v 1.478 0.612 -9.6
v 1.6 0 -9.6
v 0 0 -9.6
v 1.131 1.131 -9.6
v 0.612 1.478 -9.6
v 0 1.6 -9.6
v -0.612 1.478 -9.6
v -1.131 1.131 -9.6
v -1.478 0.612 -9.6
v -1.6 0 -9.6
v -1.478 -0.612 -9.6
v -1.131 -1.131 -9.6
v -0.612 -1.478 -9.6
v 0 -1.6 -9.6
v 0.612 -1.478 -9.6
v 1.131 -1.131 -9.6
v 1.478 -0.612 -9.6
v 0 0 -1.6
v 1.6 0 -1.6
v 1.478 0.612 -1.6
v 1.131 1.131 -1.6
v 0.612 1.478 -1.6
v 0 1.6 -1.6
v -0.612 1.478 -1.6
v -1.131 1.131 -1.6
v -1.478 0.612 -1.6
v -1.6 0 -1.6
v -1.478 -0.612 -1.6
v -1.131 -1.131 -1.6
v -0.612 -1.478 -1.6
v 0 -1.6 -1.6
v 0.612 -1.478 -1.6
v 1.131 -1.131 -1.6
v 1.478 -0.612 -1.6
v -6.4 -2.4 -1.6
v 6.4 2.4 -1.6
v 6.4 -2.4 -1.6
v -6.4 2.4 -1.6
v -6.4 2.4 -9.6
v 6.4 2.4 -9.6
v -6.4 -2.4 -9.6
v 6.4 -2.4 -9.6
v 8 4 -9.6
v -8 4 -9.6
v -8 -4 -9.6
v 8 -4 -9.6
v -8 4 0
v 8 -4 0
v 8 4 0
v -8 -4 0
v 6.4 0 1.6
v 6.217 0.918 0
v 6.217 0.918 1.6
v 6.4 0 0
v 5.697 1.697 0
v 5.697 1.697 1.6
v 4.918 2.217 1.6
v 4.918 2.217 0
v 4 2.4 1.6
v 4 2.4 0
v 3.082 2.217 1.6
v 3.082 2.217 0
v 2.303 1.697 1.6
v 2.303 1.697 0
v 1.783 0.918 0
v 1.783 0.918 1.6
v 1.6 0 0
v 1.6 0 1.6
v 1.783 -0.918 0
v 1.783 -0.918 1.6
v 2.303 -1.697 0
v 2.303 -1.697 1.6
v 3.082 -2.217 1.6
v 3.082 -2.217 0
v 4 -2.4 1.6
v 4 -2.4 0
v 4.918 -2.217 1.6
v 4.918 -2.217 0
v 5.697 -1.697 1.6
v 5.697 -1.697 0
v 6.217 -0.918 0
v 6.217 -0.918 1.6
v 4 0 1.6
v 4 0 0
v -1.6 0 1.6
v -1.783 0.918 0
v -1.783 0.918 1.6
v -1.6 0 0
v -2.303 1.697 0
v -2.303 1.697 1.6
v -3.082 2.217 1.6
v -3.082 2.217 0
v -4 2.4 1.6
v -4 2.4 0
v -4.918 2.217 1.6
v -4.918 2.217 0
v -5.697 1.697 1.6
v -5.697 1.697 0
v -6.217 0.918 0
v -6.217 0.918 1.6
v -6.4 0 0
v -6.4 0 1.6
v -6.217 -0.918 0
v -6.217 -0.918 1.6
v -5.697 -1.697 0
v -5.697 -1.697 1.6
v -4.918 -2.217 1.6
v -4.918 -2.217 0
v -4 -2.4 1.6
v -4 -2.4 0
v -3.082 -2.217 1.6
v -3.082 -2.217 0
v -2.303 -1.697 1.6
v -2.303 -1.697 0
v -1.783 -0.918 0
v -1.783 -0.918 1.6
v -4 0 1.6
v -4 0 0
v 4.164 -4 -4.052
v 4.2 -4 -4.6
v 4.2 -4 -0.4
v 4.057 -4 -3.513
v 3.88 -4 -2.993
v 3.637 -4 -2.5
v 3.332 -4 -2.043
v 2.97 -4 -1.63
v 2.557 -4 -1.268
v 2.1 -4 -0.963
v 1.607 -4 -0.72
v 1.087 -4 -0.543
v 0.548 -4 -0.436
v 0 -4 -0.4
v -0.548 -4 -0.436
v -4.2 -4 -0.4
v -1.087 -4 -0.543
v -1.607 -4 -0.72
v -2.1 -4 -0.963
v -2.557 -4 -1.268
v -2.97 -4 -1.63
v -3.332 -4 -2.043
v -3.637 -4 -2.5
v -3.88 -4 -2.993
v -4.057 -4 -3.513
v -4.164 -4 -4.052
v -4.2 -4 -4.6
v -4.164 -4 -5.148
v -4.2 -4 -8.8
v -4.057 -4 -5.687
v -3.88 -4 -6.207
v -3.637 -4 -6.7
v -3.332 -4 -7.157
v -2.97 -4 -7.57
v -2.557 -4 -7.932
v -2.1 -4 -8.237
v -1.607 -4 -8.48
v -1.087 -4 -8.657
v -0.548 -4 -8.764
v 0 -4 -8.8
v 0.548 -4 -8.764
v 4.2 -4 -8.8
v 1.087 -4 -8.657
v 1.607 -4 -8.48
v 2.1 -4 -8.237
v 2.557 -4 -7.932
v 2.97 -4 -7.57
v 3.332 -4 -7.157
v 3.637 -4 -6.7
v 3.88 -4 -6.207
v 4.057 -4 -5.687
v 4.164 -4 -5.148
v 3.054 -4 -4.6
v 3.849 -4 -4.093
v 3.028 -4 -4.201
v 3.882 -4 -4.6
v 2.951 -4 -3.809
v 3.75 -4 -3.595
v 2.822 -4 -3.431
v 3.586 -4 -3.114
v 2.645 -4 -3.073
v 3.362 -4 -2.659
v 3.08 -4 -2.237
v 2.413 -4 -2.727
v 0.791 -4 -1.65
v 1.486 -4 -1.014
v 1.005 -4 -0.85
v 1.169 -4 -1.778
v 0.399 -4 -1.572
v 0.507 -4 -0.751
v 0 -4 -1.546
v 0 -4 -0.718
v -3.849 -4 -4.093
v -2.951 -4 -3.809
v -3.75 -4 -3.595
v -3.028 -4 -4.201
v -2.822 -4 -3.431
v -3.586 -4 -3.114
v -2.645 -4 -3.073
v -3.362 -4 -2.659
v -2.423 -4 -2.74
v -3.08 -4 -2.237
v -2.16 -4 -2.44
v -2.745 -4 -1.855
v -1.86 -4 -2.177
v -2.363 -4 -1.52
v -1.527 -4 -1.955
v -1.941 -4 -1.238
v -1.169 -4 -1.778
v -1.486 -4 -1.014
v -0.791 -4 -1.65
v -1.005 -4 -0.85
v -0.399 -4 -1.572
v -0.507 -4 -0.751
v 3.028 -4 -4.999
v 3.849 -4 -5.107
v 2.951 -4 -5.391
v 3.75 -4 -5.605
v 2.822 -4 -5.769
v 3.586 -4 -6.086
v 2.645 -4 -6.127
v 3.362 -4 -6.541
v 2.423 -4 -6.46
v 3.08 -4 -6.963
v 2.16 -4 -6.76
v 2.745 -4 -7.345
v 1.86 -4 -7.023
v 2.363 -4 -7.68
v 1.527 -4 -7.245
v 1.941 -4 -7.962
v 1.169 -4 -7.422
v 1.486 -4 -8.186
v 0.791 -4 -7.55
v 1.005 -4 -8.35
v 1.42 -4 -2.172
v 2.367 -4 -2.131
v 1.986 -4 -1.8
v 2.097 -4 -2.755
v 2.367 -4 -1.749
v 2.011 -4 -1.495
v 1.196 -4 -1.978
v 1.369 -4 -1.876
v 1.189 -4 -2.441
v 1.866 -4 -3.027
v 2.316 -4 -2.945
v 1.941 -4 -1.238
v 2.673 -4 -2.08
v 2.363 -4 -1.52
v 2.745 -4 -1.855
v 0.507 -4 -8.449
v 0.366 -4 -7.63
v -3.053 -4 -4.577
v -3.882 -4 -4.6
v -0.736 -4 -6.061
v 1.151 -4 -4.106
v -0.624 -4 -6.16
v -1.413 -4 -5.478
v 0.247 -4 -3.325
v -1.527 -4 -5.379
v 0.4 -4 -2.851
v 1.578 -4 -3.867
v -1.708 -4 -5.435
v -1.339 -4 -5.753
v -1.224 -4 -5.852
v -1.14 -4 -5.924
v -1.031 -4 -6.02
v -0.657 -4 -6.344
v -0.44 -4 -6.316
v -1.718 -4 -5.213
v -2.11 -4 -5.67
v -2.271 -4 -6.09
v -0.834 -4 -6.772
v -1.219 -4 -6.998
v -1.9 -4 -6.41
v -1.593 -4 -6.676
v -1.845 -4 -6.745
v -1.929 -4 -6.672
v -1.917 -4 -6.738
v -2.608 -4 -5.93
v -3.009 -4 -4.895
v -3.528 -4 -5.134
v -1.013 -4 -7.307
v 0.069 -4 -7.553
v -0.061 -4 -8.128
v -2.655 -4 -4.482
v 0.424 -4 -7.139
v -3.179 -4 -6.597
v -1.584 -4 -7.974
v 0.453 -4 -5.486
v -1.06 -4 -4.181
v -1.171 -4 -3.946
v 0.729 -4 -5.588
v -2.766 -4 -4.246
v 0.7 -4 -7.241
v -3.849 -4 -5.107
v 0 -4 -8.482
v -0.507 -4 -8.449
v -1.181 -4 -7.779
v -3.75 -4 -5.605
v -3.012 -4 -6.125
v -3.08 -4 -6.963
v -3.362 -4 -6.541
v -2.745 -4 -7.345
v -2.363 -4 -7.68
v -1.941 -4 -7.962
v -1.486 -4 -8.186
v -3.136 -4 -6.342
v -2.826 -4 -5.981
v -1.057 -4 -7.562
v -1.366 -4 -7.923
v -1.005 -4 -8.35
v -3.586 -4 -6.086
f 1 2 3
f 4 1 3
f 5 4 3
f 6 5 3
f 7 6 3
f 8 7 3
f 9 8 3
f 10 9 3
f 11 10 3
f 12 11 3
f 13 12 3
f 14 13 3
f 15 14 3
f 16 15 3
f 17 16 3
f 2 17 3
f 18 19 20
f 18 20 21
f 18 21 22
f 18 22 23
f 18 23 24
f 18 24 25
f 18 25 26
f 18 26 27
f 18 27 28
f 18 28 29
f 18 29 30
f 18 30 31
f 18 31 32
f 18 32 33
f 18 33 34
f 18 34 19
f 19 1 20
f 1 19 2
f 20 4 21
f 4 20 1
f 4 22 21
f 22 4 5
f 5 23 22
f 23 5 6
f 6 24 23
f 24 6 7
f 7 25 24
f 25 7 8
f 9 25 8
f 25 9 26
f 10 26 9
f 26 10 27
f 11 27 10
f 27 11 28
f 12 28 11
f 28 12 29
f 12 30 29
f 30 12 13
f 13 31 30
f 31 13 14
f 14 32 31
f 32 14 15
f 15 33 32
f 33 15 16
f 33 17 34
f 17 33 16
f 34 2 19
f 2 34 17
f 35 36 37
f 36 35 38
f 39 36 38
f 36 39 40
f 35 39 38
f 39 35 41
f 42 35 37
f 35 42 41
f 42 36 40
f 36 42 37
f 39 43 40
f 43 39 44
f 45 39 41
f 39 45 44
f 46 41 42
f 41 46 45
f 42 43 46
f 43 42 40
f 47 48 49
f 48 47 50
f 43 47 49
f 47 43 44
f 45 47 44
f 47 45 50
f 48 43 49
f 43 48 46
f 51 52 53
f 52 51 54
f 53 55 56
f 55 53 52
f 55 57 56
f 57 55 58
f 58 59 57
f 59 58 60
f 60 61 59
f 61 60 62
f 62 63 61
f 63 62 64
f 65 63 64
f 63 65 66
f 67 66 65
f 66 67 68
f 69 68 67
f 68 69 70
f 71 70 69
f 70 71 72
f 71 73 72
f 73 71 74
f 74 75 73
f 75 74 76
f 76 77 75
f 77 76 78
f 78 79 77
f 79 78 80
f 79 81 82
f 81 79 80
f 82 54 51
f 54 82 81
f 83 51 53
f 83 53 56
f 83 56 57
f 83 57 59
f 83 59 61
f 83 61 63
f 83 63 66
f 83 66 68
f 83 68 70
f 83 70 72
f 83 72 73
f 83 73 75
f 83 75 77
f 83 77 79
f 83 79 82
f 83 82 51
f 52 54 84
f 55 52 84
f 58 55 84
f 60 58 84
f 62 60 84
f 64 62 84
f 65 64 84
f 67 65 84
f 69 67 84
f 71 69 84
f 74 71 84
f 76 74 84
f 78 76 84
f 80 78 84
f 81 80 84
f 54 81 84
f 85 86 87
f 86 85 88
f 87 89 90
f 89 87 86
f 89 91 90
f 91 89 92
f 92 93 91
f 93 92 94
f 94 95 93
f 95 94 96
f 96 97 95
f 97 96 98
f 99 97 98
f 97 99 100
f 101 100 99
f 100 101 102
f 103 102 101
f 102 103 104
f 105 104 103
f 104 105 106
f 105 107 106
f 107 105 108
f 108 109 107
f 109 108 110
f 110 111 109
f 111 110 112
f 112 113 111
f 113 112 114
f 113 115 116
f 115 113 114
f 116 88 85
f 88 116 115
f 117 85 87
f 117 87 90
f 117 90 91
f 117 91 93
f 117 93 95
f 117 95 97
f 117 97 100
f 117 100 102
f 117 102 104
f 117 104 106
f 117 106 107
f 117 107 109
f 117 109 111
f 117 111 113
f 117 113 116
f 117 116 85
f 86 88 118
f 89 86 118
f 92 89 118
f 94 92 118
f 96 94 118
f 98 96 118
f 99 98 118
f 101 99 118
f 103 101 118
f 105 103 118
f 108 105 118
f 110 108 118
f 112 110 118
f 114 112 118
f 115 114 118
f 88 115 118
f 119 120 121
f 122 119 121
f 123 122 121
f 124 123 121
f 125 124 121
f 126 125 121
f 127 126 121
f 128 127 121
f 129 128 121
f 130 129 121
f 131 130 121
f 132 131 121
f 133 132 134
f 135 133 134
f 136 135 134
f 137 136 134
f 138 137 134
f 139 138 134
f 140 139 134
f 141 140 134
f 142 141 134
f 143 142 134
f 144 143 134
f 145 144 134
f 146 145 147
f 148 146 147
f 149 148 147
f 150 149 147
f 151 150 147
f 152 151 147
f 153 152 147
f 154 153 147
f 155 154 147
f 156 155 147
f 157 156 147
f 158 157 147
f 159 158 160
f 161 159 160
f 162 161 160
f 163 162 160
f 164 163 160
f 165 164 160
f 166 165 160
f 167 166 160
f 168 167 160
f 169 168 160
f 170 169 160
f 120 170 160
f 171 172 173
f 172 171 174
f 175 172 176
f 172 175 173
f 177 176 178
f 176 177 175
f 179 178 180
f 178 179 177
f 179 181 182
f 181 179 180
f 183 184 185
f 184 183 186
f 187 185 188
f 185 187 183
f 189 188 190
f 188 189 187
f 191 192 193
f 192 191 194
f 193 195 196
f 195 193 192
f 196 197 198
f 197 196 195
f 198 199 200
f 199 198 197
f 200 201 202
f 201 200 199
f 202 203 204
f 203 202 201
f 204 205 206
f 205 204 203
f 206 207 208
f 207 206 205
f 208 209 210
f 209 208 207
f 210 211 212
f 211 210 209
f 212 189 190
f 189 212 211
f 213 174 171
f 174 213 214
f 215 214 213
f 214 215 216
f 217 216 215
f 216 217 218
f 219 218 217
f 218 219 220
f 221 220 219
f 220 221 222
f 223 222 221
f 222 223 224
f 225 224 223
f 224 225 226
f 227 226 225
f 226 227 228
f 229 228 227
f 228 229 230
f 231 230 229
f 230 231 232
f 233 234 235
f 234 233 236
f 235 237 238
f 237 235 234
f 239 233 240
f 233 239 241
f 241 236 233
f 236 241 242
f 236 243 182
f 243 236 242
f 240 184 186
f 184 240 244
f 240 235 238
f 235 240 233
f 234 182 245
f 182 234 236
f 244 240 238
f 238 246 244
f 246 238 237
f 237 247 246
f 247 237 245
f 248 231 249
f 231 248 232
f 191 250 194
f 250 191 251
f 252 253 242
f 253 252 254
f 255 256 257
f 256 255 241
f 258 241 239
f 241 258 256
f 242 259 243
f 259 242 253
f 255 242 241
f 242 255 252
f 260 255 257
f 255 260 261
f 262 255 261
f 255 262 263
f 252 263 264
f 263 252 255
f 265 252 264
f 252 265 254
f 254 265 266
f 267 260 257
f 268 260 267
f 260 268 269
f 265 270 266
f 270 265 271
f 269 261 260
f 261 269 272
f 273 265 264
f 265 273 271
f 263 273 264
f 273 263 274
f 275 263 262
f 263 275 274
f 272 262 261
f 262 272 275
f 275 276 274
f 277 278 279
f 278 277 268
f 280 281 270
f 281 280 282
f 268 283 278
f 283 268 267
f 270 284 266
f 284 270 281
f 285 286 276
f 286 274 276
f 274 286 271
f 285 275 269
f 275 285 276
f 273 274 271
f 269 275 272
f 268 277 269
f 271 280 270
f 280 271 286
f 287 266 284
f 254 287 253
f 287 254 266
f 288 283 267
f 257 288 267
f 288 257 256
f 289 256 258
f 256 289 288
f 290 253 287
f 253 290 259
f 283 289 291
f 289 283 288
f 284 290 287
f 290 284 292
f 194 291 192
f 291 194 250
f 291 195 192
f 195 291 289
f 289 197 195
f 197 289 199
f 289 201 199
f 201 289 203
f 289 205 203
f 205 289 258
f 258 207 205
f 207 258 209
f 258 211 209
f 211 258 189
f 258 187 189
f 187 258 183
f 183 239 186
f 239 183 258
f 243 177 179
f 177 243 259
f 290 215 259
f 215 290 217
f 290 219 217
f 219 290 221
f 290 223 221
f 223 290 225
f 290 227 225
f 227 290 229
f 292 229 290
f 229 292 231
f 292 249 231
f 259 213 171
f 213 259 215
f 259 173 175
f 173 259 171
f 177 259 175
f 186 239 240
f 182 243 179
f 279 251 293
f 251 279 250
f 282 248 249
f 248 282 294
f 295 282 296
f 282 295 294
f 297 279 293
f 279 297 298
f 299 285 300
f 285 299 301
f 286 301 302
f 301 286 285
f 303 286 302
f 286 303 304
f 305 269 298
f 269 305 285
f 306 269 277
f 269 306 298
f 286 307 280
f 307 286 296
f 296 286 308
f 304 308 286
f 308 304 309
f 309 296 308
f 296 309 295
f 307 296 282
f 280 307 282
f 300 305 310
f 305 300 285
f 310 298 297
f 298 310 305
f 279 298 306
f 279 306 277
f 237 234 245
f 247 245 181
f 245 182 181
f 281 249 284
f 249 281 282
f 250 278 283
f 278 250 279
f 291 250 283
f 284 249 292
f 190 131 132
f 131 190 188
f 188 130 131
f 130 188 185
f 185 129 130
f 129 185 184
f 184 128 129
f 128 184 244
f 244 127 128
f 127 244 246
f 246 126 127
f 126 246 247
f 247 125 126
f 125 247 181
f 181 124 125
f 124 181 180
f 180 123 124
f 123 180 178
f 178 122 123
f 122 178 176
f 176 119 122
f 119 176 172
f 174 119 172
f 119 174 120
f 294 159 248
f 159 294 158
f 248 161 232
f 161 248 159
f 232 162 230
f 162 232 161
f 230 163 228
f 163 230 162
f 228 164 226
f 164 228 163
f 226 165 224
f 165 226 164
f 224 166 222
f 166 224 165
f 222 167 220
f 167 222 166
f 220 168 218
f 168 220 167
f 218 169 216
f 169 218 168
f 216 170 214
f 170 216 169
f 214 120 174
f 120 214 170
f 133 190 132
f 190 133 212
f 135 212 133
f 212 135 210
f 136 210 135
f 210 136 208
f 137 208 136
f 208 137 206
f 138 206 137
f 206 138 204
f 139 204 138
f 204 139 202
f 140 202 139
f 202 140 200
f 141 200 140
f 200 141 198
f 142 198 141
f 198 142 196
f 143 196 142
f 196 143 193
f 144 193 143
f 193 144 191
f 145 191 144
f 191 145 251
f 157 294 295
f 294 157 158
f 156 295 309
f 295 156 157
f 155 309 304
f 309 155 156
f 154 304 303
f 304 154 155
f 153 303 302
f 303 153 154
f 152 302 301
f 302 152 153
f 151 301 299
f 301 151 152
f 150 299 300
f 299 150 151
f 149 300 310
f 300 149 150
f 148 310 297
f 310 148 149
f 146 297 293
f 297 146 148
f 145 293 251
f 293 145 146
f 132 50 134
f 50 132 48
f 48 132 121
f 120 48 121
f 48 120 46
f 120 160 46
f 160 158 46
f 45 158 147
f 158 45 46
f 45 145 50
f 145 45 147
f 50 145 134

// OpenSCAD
// file: ../p/4-4edge.scad
use <../lib.scad>
function ldraw_lib__4_4edge() = [
// 0 Circle 1.0
// 0 Name: 4-4edge.dat
// 0 Author: James Jessiman
// 0 !LDRAW_ORG Primitive UPDATE 2017-01
// 0 !LICENSE Licensed under CC BY 2.0 and CC BY 4.0 : see CAreadme.txt
// 
// 0 BFC CERTIFY CCW
  [0,"BFC","CERTIFY"],
  [0,"BFC","CCW"],
// 
// 0 !HISTORY 1998-12-15 [PTadmin] Official Update 1998-10
// 0 !HISTORY 2005-12-28 [PTadmin] Official Update 2005-01
// 0 !HISTORY 2007-06-24 [PTadmin] Header formatted for Contributor Agreement
// 0 !HISTORY 2008-07-01 [PTadmin] Official Update 2008-01
// 0 !HISTORY 2017-01-15 [Steffen] BFCed
// 0 !HISTORY 2017-12-30 [PTadmin] Official Update 2017-01
// 
// 
// 2 24 1 0 0 0.9239 0 0.3827
  [2,24,1,0,0,0.9239,0,0.3827],
// 2 24 0.9239 0 0.3827 0.7071 0 0.7071
  [2,24,0.9239,0,0.3827,0.7071,0,0.7071],
// 2 24 0.7071 0 0.7071 0.3827 0 0.9239
  [2,24,0.7071,0,0.7071,0.3827,0,0.9239],
// 2 24 0.3827 0 0.9239 0 0 1
  [2,24,0.3827,0,0.9239,0,0,1],
// 2 24 0 0 1 -0.3827 0 0.9239
  [2,24,0,0,1,-0.3827,0,0.9239],
// 2 24 -0.3827 0 0.9239 -0.7071 0 0.7071
  [2,24,-0.3827,0,0.9239,-0.7071,0,0.7071],
// 2 24 -0.7071 0 0.7071 -0.9239 0 0.3827
  [2,24,-0.7071,0,0.7071,-0.9239,0,0.3827],
// 2 24 -0.9239 0 0.3827 -1 0 -0
  [2,24,-0.9239,0,0.3827,-1,0,-0],
// 2 24 -1 0 -0 -0.9239 0 -0.3827
  [2,24,-1,0,-0,-0.9239,0,-0.3827],
// 2 24 -0.9239 0 -0.3827 -0.7071 0 -0.7071
  [2,24,-0.9239,0,-0.3827,-0.7071,0,-0.7071],
// 2 24 -0.7071 0 -0.7071 -0.3827 0 -0.9239
  [2,24,-0.7071,0,-0.7071,-0.3827,0,-0.9239],
// 2 24 -0.3827 0 -0.9239 0 0 -1
  [2,24,-0.3827,0,-0.9239,0,0,-1],
// 2 24 0 0 -1 0.3827 0 -0.9239
  [2,24,0,0,-1,0.3827,0,-0.9239],
// 2 24 0.3827 0 -0.9239 0.7071 0 -0.7071
  [2,24,0.3827,0,-0.9239,0.7071,0,-0.7071],
// 2 24 0.7071 0 -0.7071 0.9239 0 -0.3827
  [2,24,0.7071,0,-0.7071,0.9239,0,-0.3827],
// 2 24 0.9239 0 -0.3827 1 0 0
  [2,24,0.9239,0,-0.3827,1,0,0],
];
module ldraw_lib__4_4edge(step=0, col=false, unit=2/5, alt=false, line=0.2, solid=!$preview)
    makepoly(ldraw_lib__4_4edge(), step=step, col=col, unit=unit, alt=alt, line=line, solid=solid);
ldraw_lib__4_4edge(line=0.2);
// file: ../p/4-4disc.scad
use <../lib.scad>
function ldraw_lib__4_4disc() = [
// 0 Disc 1.0
// 0 Name: 4-4disc.dat
// 0 Author: James Jessiman
// 0 !LDRAW_ORG Primitive UPDATE 2002-02
// 0 !LICENSE Licensed under CC BY 2.0 and CC BY 4.0 : see CAreadme.txt
// 
// 0 BFC CERTIFY CCW
  [0,"BFC","CERTIFY"],
  [0,"BFC","CCW"],
// 
// 0 !HISTORY 1998-12-15 [PTadmin] Official Update 1998-10
// 0 !HISTORY 2002-03-23 [sbliss] Added BFC statement
// 0 !HISTORY 2002-04-25 [PTadmin] Official Update 2002-02
// 0 !HISTORY 2007-06-24 [PTadmin] Header formatted for Contributor Agreement
// 0 !HISTORY 2008-07-01 [PTadmin] Official Update 2008-01
// 
// 
// 3 16 0 0 0 1 0 0 0.9239 0 0.3827
  [3,16,0,0,0,1,0,0,0.9239,0,0.3827],
// 3 16 0 0 0 0.9239 0 0.3827 0.7071 0 0.7071
  [3,16,0,0,0,0.9239,0,0.3827,0.7071,0,0.7071],
// 3 16 0 0 0 0.7071 0 0.7071 0.3827 0 0.9239
  [3,16,0,0,0,0.7071,0,0.7071,0.3827,0,0.9239],
// 3 16 0 0 0 0.3827 0 0.9239 0 0 1
  [3,16,0,0,0,0.3827,0,0.9239,0,0,1],
// 3 16 0 0 0 0 0 1 -0.3827 0 0.9239
  [3,16,0,0,0,0,0,1,-0.3827,0,0.9239],
// 3 16 0 0 0 -0.3827 0 0.9239 -0.7071 0 0.7071
  [3,16,0,0,0,-0.3827,0,0.9239,-0.7071,0,0.7071],
// 3 16 0 0 0 -0.7071 0 0.7071 -0.9239 0 0.3827
  [3,16,0,0,0,-0.7071,0,0.7071,-0.9239,0,0.3827],
// 3 16 0 0 0 -0.9239 0 0.3827 -1 0 -0
  [3,16,0,0,0,-0.9239,0,0.3827,-1,0,-0],
// 3 16 0 0 0 -1 0 -0 -0.9239 0 -0.3827
  [3,16,0,0,0,-1,0,-0,-0.9239,0,-0.3827],
// 3 16 0 0 0 -0.9239 0 -0.3827 -0.7071 0 -0.7071
  [3,16,0,0,0,-0.9239,0,-0.3827,-0.7071,0,-0.7071],
// 3 16 0 0 0 -0.7071 0 -0.7071 -0.3827 0 -0.9239
  [3,16,0,0,0,-0.7071,0,-0.7071,-0.3827,0,-0.9239],
// 3 16 0 0 0 -0.3827 0 -0.9239 0 0 -1
  [3,16,0,0,0,-0.3827,0,-0.9239,0,0,-1],
// 3 16 0 0 0 0 0 -1 0.3827 0 -0.9239
  [3,16,0,0,0,0,0,-1,0.3827,0,-0.9239],
// 3 16 0 0 0 0.3827 0 -0.9239 0.7071 0 -0.7071
  [3,16,0,0,0,0.3827,0,-0.9239,0.7071,0,-0.7071],
// 3 16 0 0 0 0.7071 0 -0.7071 0.9239 0 -0.3827
  [3,16,0,0,0,0.7071,0,-0.7071,0.9239,0,-0.3827],
// 3 16 0 0 0 0.9239 0 -0.3827 1 0 0
  [3,16,0,0,0,0.9239,0,-0.3827,1,0,0],
// 0
];
module ldraw_lib__4_4disc(step=0, col=false, unit=2/5, alt=false, line=0.2, solid=!$preview)
    makepoly(ldraw_lib__4_4disc(), step=step, col=col, unit=unit, alt=alt, line=line, solid=solid);
ldraw_lib__4_4disc(line=0.2);
// file: ../p/4-4cyli.scad
use <../lib.scad>
$fa=1; $fs=0.2;
function ldraw_lib__4_4cyli(realsolid=false) = [
// 0 Cylinder 1.0
// 0 Name: 4-4cyli.dat
// 0 Author: James Jessiman
// 0 !LDRAW_ORG Primitive UPDATE 2005-01
// 0 !LICENSE Licensed under CC BY 2.0 and CC BY 4.0 : see CAreadme.txt
// 
// 0 BFC CERTIFY CCW
  [0,"BFC","CERTIFY"],
  [0,"BFC","CCW"],
// 
// 0 !HISTORY 1998-12-15 [PTadmin] Official Update 1998-10
// 0 !HISTORY 2002-03-23 [sbliss] Added BFC statement; merged headers from files in distributions LDraw 0.27 and Complete.
// 0 !HISTORY 2002-04-25 [PTadmin] Official Update 2002-02
// 0 !HISTORY 2004-12-14 [guyvivan] BFC CCW
// 0 !HISTORY 2005-12-28 [PTadmin] Official Update 2005-01
// 0 !HISTORY 2007-06-24 [PTadmin] Header formatted for Contributor Agreement
// 0 !HISTORY 2008-07-01 [PTadmin] Official Update 2008-01
// 
// 
// 4 16 1 1 0 0.9239 1 0.3827 0.9239 0 0.3827 1 0 0
  [4,16,1,1,0,0.9239,1,0.3827,0.9239,0,0.3827,1,0,0],
// 5 24 1 0 0 1 1 0 0.9239 0 0.3827 0.9239 0 -0.3827
  [5,24,1,0,0,1,1,0,0.9239,0,0.3827,0.9239,0,-0.3827],
// 4 16 0.9239 1 0.3827 0.7071 1 0.7071 0.7071 0 0.7071 0.9239 0 0.3827
  [4,16,0.9239,1,0.3827,0.7071,1,0.7071,0.7071,0,0.7071,0.9239,0,0.3827],
// 5 24 0.9239 0 0.3827 0.9239 1 0.3827 0.7071 0 0.7071 1 0 0
  [5,24,0.9239,0,0.3827,0.9239,1,0.3827,0.7071,0,0.7071,1,0,0],
// 4 16 0.7071 1 0.7071 0.3827 1 0.9239 0.3827 0 0.9239 0.7071 0 0.7071
  [4,16,0.7071,1,0.7071,0.3827,1,0.9239,0.3827,0,0.9239,0.7071,0,0.7071],
// 5 24 0.7071 0 0.7071 0.7071 1 0.7071 0.3827 0 0.9239 0.9239 0 0.3827
  [5,24,0.7071,0,0.7071,0.7071,1,0.7071,0.3827,0,0.9239,0.9239,0,0.3827],
// 4 16 0.3827 1 0.9239 0 1 1 0 0 1 0.3827 0 0.9239
  [4,16,0.3827,1,0.9239,0,1,1,0,0,1,0.3827,0,0.9239],
// 5 24 0.3827 0 0.9239 0.3827 1 0.9239 0 0 1 0.7071 0 0.7071
  [5,24,0.3827,0,0.9239,0.3827,1,0.9239,0,0,1,0.7071,0,0.7071],
// 4 16 0 1 1 -0.3827 1 0.9239 -0.3827 0 0.9239 0 0 1
  [4,16,0,1,1,-0.3827,1,0.9239,-0.3827,0,0.9239,0,0,1],
// 5 24 0 0 1 0 1 1 -0.3827 0 0.9239 0.3827 0 0.9239
  [5,24,0,0,1,0,1,1,-0.3827,0,0.9239,0.3827,0,0.9239],
// 4 16 -0.3827 1 0.9239 -0.7071 1 0.7071 -0.7071 0 0.7071 -0.3827 0 0.9239
  [4,16,-0.3827,1,0.9239,-0.7071,1,0.7071,-0.7071,0,0.7071,-0.3827,0,0.9239],
// 5 24 -0.3827 0 0.9239 -0.3827 1 0.9239 -0.7071 0 0.7071 0 0 1
  [5,24,-0.3827,0,0.9239,-0.3827,1,0.9239,-0.7071,0,0.7071,0,0,1],
// 4 16 -0.7071 1 0.7071 -0.9239 1 0.3827 -0.9239 0 0.3827 -0.7071 0 0.7071
  [4,16,-0.7071,1,0.7071,-0.9239,1,0.3827,-0.9239,0,0.3827,-0.7071,0,0.7071],
// 5 24 -0.7071 0 0.7071 -0.7071 1 0.7071 -0.9239 0 0.3827 -0.3827 0 0.9239
  [5,24,-0.7071,0,0.7071,-0.7071,1,0.7071,-0.9239,0,0.3827,-0.3827,0,0.9239],
// 4 16 -0.9239 1 0.3827 -1 1 0 -1 0 0 -0.9239 0 0.3827
  [4,16,-0.9239,1,0.3827,-1,1,0,-1,0,0,-0.9239,0,0.3827],
// 5 24 -0.9239 0 0.3827 -0.9239 1 0.3827 -1 0 0 -0.7071 0 0.7071
  [5,24,-0.9239,0,0.3827,-0.9239,1,0.3827,-1,0,0,-0.7071,0,0.7071],
// 4 16 -1 1 0 -0.9239 1 -0.3827 -0.9239 0 -0.3827 -1 0 0
  [4,16,-1,1,0,-0.9239,1,-0.3827,-0.9239,0,-0.3827,-1,0,0],
// 5 24 -1 0 0 -1 1 0 -0.9239 0 -0.3827 -0.9239 0 0.3827
  [5,24,-1,0,0,-1,1,0,-0.9239,0,-0.3827,-0.9239,0,0.3827],
// 4 16 -0.9239 1 -0.3827 -0.7071 1 -0.7071 -0.7071 0 -0.7071 -0.9239 0 -0.3827
  [4,16,-0.9239,1,-0.3827,-0.7071,1,-0.7071,-0.7071,0,-0.7071,-0.9239,0,-0.3827],
// 5 24 -0.9239 0 -0.3827 -0.9239 1 -0.3827 -0.7071 0 -0.7071 -1 0 0
  [5,24,-0.9239,0,-0.3827,-0.9239,1,-0.3827,-0.7071,0,-0.7071,-1,0,0],
// 4 16 -0.7071 1 -0.7071 -0.3827 1 -0.9239 -0.3827 0 -0.9239 -0.7071 0 -0.7071
  [4,16,-0.7071,1,-0.7071,-0.3827,1,-0.9239,-0.3827,0,-0.9239,-0.7071,0,-0.7071],
// 5 24 -0.7071 0 -0.7071 -0.7071 1 -0.7071 -0.3827 0 -0.9239 -0.9239 0 -0.3827
  [5,24,-0.7071,0,-0.7071,-0.7071,1,-0.7071,-0.3827,0,-0.9239,-0.9239,0,-0.3827],
// 4 16 -0.3827 1 -0.9239 0 1 -1 0 0 -1 -0.3827 0 -0.9239
  [4,16,-0.3827,1,-0.9239,0,1,-1,0,0,-1,-0.3827,0,-0.9239],
// 5 24 -0.3827 0 -0.9239 -0.3827 1 -0.9239 0 0 -1 -0.7071 0 -0.7071
  [5,24,-0.3827,0,-0.9239,-0.3827,1,-0.9239,0,0,-1,-0.7071,0,-0.7071],
// 4 16 0 1 -1 0.3827 1 -0.9239 0.3827 0 -0.9239 0 0 -1
  [4,16,0,1,-1,0.3827,1,-0.9239,0.3827,0,-0.9239,0,0,-1],
// 5 24 0 0 -1 0 1 -1 0.3827 0 -0.9239 -0.3827 0 -0.9239
  [5,24,0,0,-1,0,1,-1,0.3827,0,-0.9239,-0.3827,0,-0.9239],
// 4 16 0.3827 1 -0.9239 0.7071 1 -0.7071 0.7071 0 -0.7071 0.3827 0 -0.9239
  [4,16,0.3827,1,-0.9239,0.7071,1,-0.7071,0.7071,0,-0.7071,0.3827,0,-0.9239],
// 5 24 0.3827 0 -0.9239 0.3827 1 -0.9239 0.7071 0 -0.7071 0 0 -1
  [5,24,0.3827,0,-0.9239,0.3827,1,-0.9239,0.7071,0,-0.7071,0,0,-1],
// 4 16 0.7071 1 -0.7071 0.9239 1 -0.3827 0.9239 0 -0.3827 0.7071 0 -0.7071
  [4,16,0.7071,1,-0.7071,0.9239,1,-0.3827,0.9239,0,-0.3827,0.7071,0,-0.7071],
// 5 24 0.7071 0 -0.7071 0.7071 1 -0.7071 0.9239 0 -0.3827 0.3827 0 -0.9239
  [5,24,0.7071,0,-0.7071,0.7071,1,-0.7071,0.9239,0,-0.3827,0.3827,0,-0.9239],
// 4 16 0.9239 1 -0.3827 1 1 0 1 0 0 0.9239 0 -0.3827
  [4,16,0.9239,1,-0.3827,1,1,0,1,0,0,0.9239,0,-0.3827],
// 5 24 0.9239 0 -0.3827 0.9239 1 -0.3827 1 0 0 0.7071 0 -0.7071
  [5,24,0.9239,0,-0.3827,0.9239,1,-0.3827,1,0,0,0.7071,0,-0.7071],
// 0
];
module ldraw_lib__4_4cyli(step=0, col=false, unit=2/5, alt=false, line=0.2, solid=!$preview)
    makepoly(ldraw_lib__4_4cyli(solid), step=step, col=col, unit=unit, alt=alt, line=line, solid=solid);
ldraw_lib__4_4cyli(line=0.2);
// file: ../p/stud3.scad
use <../lib.scad>
use <4-4cyli.scad>
use <4-4disc.scad>
use <4-4edge.scad>
function ldraw_lib__stud3() = [
// 0 Stud Tube Solid
// 0 Name: stud3.dat
// 0 Author: James Jessiman
// 0 !LDRAW_ORG Primitive UPDATE 2012-01
// 0 !LICENSE Licensed under CC BY 4.0 : see CAreadme.txt
// 
// 0 BFC CERTIFY CCW
  [0,"BFC","CERTIFY"],
  [0,"BFC","CCW"],
// 
// 0 !HISTORY 2002-04-04 [sbliss] Modified for BFC compliance
// 0 !HISTORY 2002-04-25 [PTadmin] Official Update 2002-02
// 0 !HISTORY 2007-06-24 [PTadmin] Header formatted for Contributor Agreement
// 0 !HISTORY 2008-07-01 [PTadmin] Official Update 2008-01
// 0 !HISTORY 2012-02-16 [Philo] Changed to CCW
// 0 !HISTORY 2012-03-30 [PTadmin] Official Update 2012-01
// 
// 
// 1 16 0 -4 0 4 0 0 0 1 0 0 0 4 4-4edge.dat
  [1,16,0,-4,0,4,0,0,0,1,0,0,0,4, ldraw_lib__4_4edge()],
// 1 16 0 0 0 4 0 0 0 1 0 0 0 4 4-4edge.dat
  [1,16,0,0,0,4,0,0,0,1,0,0,0,4, ldraw_lib__4_4edge()],
// 1 16 0 -4 0 4 0 0 0 1 0 0 0 4 4-4disc.dat
  [1,16,0,-4,0,4,0,0,0,1,0,0,0,4, ldraw_lib__4_4disc()],
  [-1,16,0,0,0,4,0,0,0,-1,0,0,0,4, ldraw_lib__4_4disc()],
// 1 16 0 -4 0 4 0 0 0 4 0 0 0 4 4-4cyli.dat
  [1,16,0,-4,0,4,0,0,0,4,0,0,0,4, ldraw_lib__4_4cyli()],
];
module ldraw_lib__stud3(step=0, col=false, unit=2/5, alt=false, line=0.2, solid=!$preview)
    makepoly(ldraw_lib__stud3(), step=step, col=col, unit=unit, alt=alt, line=line, solid=solid);
ldraw_lib__stud3(line=0.2);
// file: ../p/stud.scad
use <../lib.scad>
use <4-4cyli.scad>
use <4-4disc.scad>
use <4-4edge.scad>
function ldraw_lib__stud() = [
// 0 Stud
// 0 Name: stud.dat
// 0 Author: James Jessiman
// 0 !LDRAW_ORG Primitive UPDATE 2012-01
// 0 !LICENSE Licensed under CC BY 4.0 : see CAreadme.txt
// 
// 0 BFC CERTIFY CCW
  [0,"BFC","CERTIFY"],
  [0,"BFC","CCW"],
// 
// 0 !HISTORY 2002-04-04 [sbliss] Modified for BFC compliance
// 0 !HISTORY 2002-04-25 [PTadmin] Official Update 2002-02
// 0 !HISTORY 2007-06-24 [PTadmin] Header formatted for Contributor Agreement
// 0 !HISTORY 2008-07-01 [PTadmin] Official Update 2008-01
// 0 !HISTORY 2012-02-16 [Philo] Changed to CCW
// 0 !HISTORY 2012-03-30 [PTadmin] Official Update 2012-01
// 
// 
// 1 16 0 0 0 6 0 0 0 1 0 0 0 6 4-4edge.dat
  [1,16,0,0,0,6,0,0,0,1,0,0,0,6, ldraw_lib__4_4edge()],
// 1 16 0 -4 0 6 0 0 0 1 0 0 0 6 4-4edge.dat
  [1,16,0,-4,0,6,0,0,0,1,0,0,0,6, ldraw_lib__4_4edge()],
// 1 16 0 0 0 6 0 0 0 -4 0 0 0 6 4-4cyli.dat
  [1,16,0,0,0,6,0,0,0,-4,0,0,0,6, ldraw_lib__4_4cyli()],
// 1 16 0 -4 0 6 0 0 0 1 0 0 0 6 4-4disc.dat
  [1,16,0,-4,0,6,0,0,0,1,0,0,0,6, ldraw_lib__4_4disc()],
  [-1,16,0,0,0,6,0,0,0,-1,0,0,0,6, ldraw_lib__4_4disc()],
];
module ldraw_lib__stud(step=0, col=false, unit=2/5, alt=false, line=0.2, solid=!$preview)
    makepoly(ldraw_lib__stud(), step=step, col=col, unit=unit, alt=alt, line=line, solid=solid);
ldraw_lib__stud(line=0.2);
// file: ../p/box5.scad
use <../lib.scad>
function ldraw_lib__box5() = [
// 0 Box with 5 Faces and All Edges
// 0 Name: box5.dat
// 0 Author: James Jessiman
// 0 !LDRAW_ORG Primitive UPDATE 2012-01
// 0 !LICENSE Licensed under CC BY 2.0 and CC BY 4.0 : see CAreadme.txt
// 
// 0 BFC CERTIFY CCW
  [0,"BFC","CERTIFY"],
  [0,"BFC","CCW"],
// 
// 0 !HISTORY 2002-04-03 [sbliss] Modified for BFC compliance
// 0 !HISTORY 2002-04-25 [PTadmin] Official Update 2002-02
// 0 !HISTORY 2007-06-24 [PTadmin] Header formatted for Contributor Agreement
// 0 !HISTORY 2008-07-01 [PTadmin] Official Update 2008-01
// 0 !HISTORY 2012-02-16 [Philo] Changed to CCW
// 0 !HISTORY 2012-03-30 [PTadmin] Official Update 2012-01
// 
// 
// 2 24 1 1 1 -1 1 1
  [2,24,1,1,1,-1,1,1],
// 2 24 -1 1 1 -1 1 -1
  [2,24,-1,1,1,-1,1,-1],
// 2 24 -1 1 -1 1 1 -1
  [2,24,-1,1,-1,1,1,-1],
// 2 24 1 1 -1 1 1 1
  [2,24,1,1,-1,1,1,1],
// 2 24 1 0 1 -1 0 1
  [2,24,1,0,1,-1,0,1],
// 2 24 -1 0 1 -1 0 -1
  [2,24,-1,0,1,-1,0,-1],
// 2 24 -1 0 -1 1 0 -1
  [2,24,-1,0,-1,1,0,-1],
// 2 24 1 0 -1 1 0 1
  [2,24,1,0,-1,1,0,1],
// 2 24 1 0 1 1 1 1
  [2,24,1,0,1,1,1,1],
// 2 24 -1 0 1 -1 1 1
  [2,24,-1,0,1,-1,1,1],
// 2 24 1 0 -1 1 1 -1
  [2,24,1,0,-1,1,1,-1],
// 2 24 -1 0 -1 -1 1 -1
  [2,24,-1,0,-1,-1,1,-1],
// 4 16 -1 1 1 1 1 1 1 1 -1 -1 1 -1
  [4,16,-1,1,1,1,1,1,1,1,-1,-1,1,-1],
// 4 16 -1 1 1 -1 0 1 1 0 1 1 1 1
  [4,16,-1,1,1,-1,0,1,1,0,1,1,1,1],
// 4 16 -1 1 -1 -1 0 -1 -1 0 1 -1 1 1
  [4,16,-1,1,-1,-1,0,-1,-1,0,1,-1,1,1],
// 4 16 1 1 -1 1 0 -1 -1 0 -1 -1 1 -1
  [4,16,1,1,-1,1,0,-1,-1,0,-1,-1,1,-1],
// 4 16 1 1 1 1 0 1 1 0 -1 1 1 -1
  [4,16,1,1,1,1,0,1,1,0,-1,1,1,-1],
];
makepoly(ldraw_lib__box5(), line=0.2);
// file: ../p/box4t.scad
use <../lib.scad>
function ldraw_lib__box4t() = [
// 0 Box with 4 Adjacent Faces and All Edges
// 0 Name: box4t.dat
// 0 Author: Tore Eriksson [Tore_Eriksson]
// 0 !LDRAW_ORG Primitive UPDATE 2003-02
// 0 !LICENSE Licensed under CC BY 2.0 and CC BY 4.0 : see CAreadme.txt
// 
// 0 BFC CERTIFY CCW
  [0,"BFC","CERTIFY"],
  [0,"BFC","CCW"],
// 
// 0 !HISTORY 1997-09-29 [PTadmin] Official Update 1997-15
// 0 !HISTORY 2002-08-31 [izanette] Modified with WINDZ for BFC compliance
// 0 !HISTORY 2003-08-01 [PTadmin] Official Update 2003-02
// 0 !HISTORY 2007-06-24 [PTadmin] Header formatted for Contributor Agreement
// 0 !HISTORY 2008-07-01 [PTadmin] Official Update 2008-01
// 
// 
// 2 24 1 1 1 -1 1 1
  [2,24,1,1,1,-1,1,1],
// 2 24 -1 1 1 -1 1 -1
  [2,24,-1,1,1,-1,1,-1],
// 2 24 -1 1 -1 1 1 -1
  [2,24,-1,1,-1,1,1,-1],
// 2 24 1 1 -1 1 1 1
  [2,24,1,1,-1,1,1,1],
// 2 24 1 0 1 -1 0 1
  [2,24,1,0,1,-1,0,1],
// 2 24 -1 0 1 -1 0 -1
  [2,24,-1,0,1,-1,0,-1],
// 2 24 -1 0 -1 1 0 -1
  [2,24,-1,0,-1,1,0,-1],
// 2 24 1 0 -1 1 0 1
  [2,24,1,0,-1,1,0,1],
// 2 24 1 0 1 1 1 1
  [2,24,1,0,1,1,1,1],
// 2 24 -1 0 1 -1 1 1
  [2,24,-1,0,1,-1,1,1],
// 2 24 1 0 -1 1 1 -1
  [2,24,1,0,-1,1,1,-1],
// 2 24 -1 0 -1 -1 1 -1
  [2,24,-1,0,-1,-1,1,-1],
// 4 16 1 1 1 1 1 -1 -1 1 -1 -1 1 1
  [4,16,1,1,1,1,1,-1,-1,1,-1,-1,1,1],
// 4 16 1 1 1 -1 1 1 -1 0 1 1 0 1
  [4,16,1,1,1,-1,1,1,-1,0,1,1,0,1],
// 4 16 -1 1 1 -1 1 -1 -1 0 -1 -1 0 1
  [4,16,-1,1,1,-1,1,-1,-1,0,-1,-1,0,1],
// 0 4 16 -1 1 -1 -1 0 -1 1 0 -1 1 1 -1
// 4 16 1 1 -1 1 1 1 1 0 1 1 0 -1
  [4,16,1,1,-1,1,1,1,1,0,1,1,0,-1],
// 0
];
makepoly(ldraw_lib__box4t(), line=0.2);
// file: s/3004s01.scad
use <../../lib.scad>
use <../../p/box4t.scad>
use <../../p/box5.scad>
use <../../p/stud.scad>
use <../../p/stud3.scad>
$fa=1; $fs=0.2;
function ldraw_lib__s__3004s01(realsolid=false) = [
// 0 ~Brick  1 x  2 without Front Face
// 0 Name: s\3004s01.dat
// 0 Author: James Jessiman
// 0 !LDRAW_ORG Subpart UPDATE 2003-03
// 0 !LICENSE Licensed under CC BY 2.0 and CC BY 4.0 : see CAreadme.txt
// 
// 0 BFC CERTIFY CCW
  [0,"BFC","CERTIFY"],
  [0,"BFC","CCW"],
// 
// 0 !HISTORY 2003-09-07 [jriley] Subfiling, BFC
// 0 !HISTORY 2003-12-19 [PTadmin] Official Update 2003-03
// 0 !HISTORY 2007-08-29 [PTadmin] Header formatted for Contributor Agreement
// 0 !HISTORY 2008-07-01 [PTadmin] Official Update 2008-01
// 
// 
// 1 16 0 4 0 1 0 0 0 -5 0 0 0 1 stud3.dat
  [1,16,0,4,0,1,0,0,0,-5,0,0,0,1, ldraw_lib__stud3(realsolid)],
// 0 BFC INVERTNEXT
  [0,"BFC","INVERTNEXT"],
// 1 16 0 24 0 16 0 0 0 -20 0 0 0 6 box5.dat
  [1,16,0,24,0,16,0,0,0,-20,0,0,0,6, ldraw_lib__box5(realsolid)],
// 4 16 20 24 10 16 24 6 -16 24 6 -20 24 10
  [4,16,20,24,10,16,24,6,-16,24,6,-20,24,10],
// 4 16 -20 24 10 -16 24 6 -16 24 -6 -20 24 -10
  [4,16,-20,24,10,-16,24,6,-16,24,-6,-20,24,-10],
// 4 16 -20 24 -10 -16 24 -6 16 24 -6 20 24 -10
  [4,16,-20,24,-10,-16,24,-6,16,24,-6,20,24,-10],
// 4 16 20 24 -10 16 24 -6 16 24 6 20 24 10
  [4,16,20,24,-10,16,24,-6,16,24,6,20,24,10],
// 1 16 0 24 0 20 0 0 0 -24 0 0 0 10 box4t.dat
  [1,16,0,24,0,20,0,0,0,-24,0,0,0,10, ldraw_lib__box4t(realsolid)],
// 1 16 10 0 0 1 0 0 0 1 0 0 0 1 stud.dat
  [1,16,10,0,0,1,0,0,0,1,0,0,0,1, ldraw_lib__stud(realsolid)],
// 1 16 -10 0 0 1 0 0 0 1 0 0 0 1 stud.dat
  [1,16,-10,0,0,1,0,0,0,1,0,0,0,1, ldraw_lib__stud(realsolid)],
// 0
];
module ldraw_lib__s__3004s01(step=0, col=false, unit=2/5, alt=false, line=0.2, solid=!$preview)
    makepoly(ldraw_lib__s__3004s01(solid), step=step, col=col, unit=unit, alt=alt, line=line, solid=solid);
ldraw_lib__s__3004s01(line=0.2);
// file: ../p/48/4-4ndis.scad
use <../../lib.scad>
$fa=1; $fs=0.2;
function ldraw_lib__48__4_4ndis(realsolid=false) = [
// 0 Hi-Res Disc Negative 1.0
// 0 Name: 48\4-4ndis.dat
// 0 Author: Franklin W. Cain [fwcain]
// 0 !LDRAW_ORG 48_Primitive UPDATE 2012-02
// 0 !LICENSE Licensed under CC BY 2.0 and CC BY 4.0 : see CAreadme.txt
// 
// 0 BFC CERTIFY CCW
  [0,"BFC","CERTIFY"],
  [0,"BFC","CCW"],
// 
// 0 !HISTORY 2004-04-22 [PTadmin] Official Update 2004-02
// 0 !HISTORY 2007-06-24 [PTadmin] Header formatted for Contributor Agreement
// 0 !HISTORY 2008-07-01 [PTadmin] Official Update 2008-01
// 0 !HISTORY 2012-02-27 [Philo] Changed to CCW
// 0 !HISTORY 2012-08-09 [PTadmin] Official Update 2012-02
// 
// 
// 3 16 0.9914 0 0.1305 1 0 0 1 0 1
  [3,16,0.9914,0,0.1305,1,0,0,1,0,1],
// 3 16 0.9659 0 0.2588 0.9914 0 0.1305 1 0 1
  [3,16,0.9659,0,0.2588,0.9914,0,0.1305,1,0,1],
// 3 16 0.9239 0 0.3827 0.9659 0 0.2588 1 0 1
  [3,16,0.9239,0,0.3827,0.9659,0,0.2588,1,0,1],
// 3 16 0.866 0 0.5 0.9239 0 0.3827 1 0 1
  [3,16,0.866,0,0.5,0.9239,0,0.3827,1,0,1],
// 3 16 0.7934 0 0.6088 0.866 0 0.5 1 0 1
  [3,16,0.7934,0,0.6088,0.866,0,0.5,1,0,1],
// 3 16 0.7071 0 0.7071 0.7934 0 0.6088 1 0 1
  [3,16,0.7071,0,0.7071,0.7934,0,0.6088,1,0,1],
// 3 16 0.6088 0 0.7934 0.7071 0 0.7071 1 0 1
  [3,16,0.6088,0,0.7934,0.7071,0,0.7071,1,0,1],
// 3 16 0.5 0 0.866 0.6088 0 0.7934 1 0 1
  [3,16,0.5,0,0.866,0.6088,0,0.7934,1,0,1],
// 3 16 0.3827 0 0.9239 0.5 0 0.866 1 0 1
  [3,16,0.3827,0,0.9239,0.5,0,0.866,1,0,1],
// 3 16 0.2588 0 0.9659 0.3827 0 0.9239 1 0 1
  [3,16,0.2588,0,0.9659,0.3827,0,0.9239,1,0,1],
// 3 16 0.1305 0 0.9914 0.2588 0 0.9659 1 0 1
  [3,16,0.1305,0,0.9914,0.2588,0,0.9659,1,0,1],
// 3 16 0 0 1 0.1305 0 0.9914 1 0 1
  [3,16,0,0,1,0.1305,0,0.9914,1,0,1],
// 3 16 -0.1305 0 0.9914 0 0 1 -1 0 1
  [3,16,-0.1305,0,0.9914,0,0,1,-1,0,1],
// 3 16 -0.2588 0 0.9659 -0.1305 0 0.9914 -1 0 1
  [3,16,-0.2588,0,0.9659,-0.1305,0,0.9914,-1,0,1],
// 3 16 -0.3827 0 0.9239 -0.2588 0 0.9659 -1 0 1
  [3,16,-0.3827,0,0.9239,-0.2588,0,0.9659,-1,0,1],
// 3 16 -0.5 0 0.866 -0.3827 0 0.9239 -1 0 1
  [3,16,-0.5,0,0.866,-0.3827,0,0.9239,-1,0,1],
// 3 16 -0.6088 0 0.7934 -0.5 0 0.866 -1 0 1
  [3,16,-0.6088,0,0.7934,-0.5,0,0.866,-1,0,1],
// 3 16 -0.7071 0 0.7071 -0.6088 0 0.7934 -1 0 1
  [3,16,-0.7071,0,0.7071,-0.6088,0,0.7934,-1,0,1],
// 3 16 -0.7934 0 0.6088 -0.7071 0 0.7071 -1 0 1
  [3,16,-0.7934,0,0.6088,-0.7071,0,0.7071,-1,0,1],
// 3 16 -0.866 0 0.5 -0.7934 0 0.6088 -1 0 1
  [3,16,-0.866,0,0.5,-0.7934,0,0.6088,-1,0,1],
// 3 16 -0.9239 0 0.3827 -0.866 0 0.5 -1 0 1
  [3,16,-0.9239,0,0.3827,-0.866,0,0.5,-1,0,1],
// 3 16 -0.9659 0 0.2588 -0.9239 0 0.3827 -1 0 1
  [3,16,-0.9659,0,0.2588,-0.9239,0,0.3827,-1,0,1],
// 3 16 -0.9914 0 0.1305 -0.9659 0 0.2588 -1 0 1
  [3,16,-0.9914,0,0.1305,-0.9659,0,0.2588,-1,0,1],
// 3 16 -1 0 0 -0.9914 0 0.1305 -1 0 1
  [3,16,-1,0,0,-0.9914,0,0.1305,-1,0,1],
// 3 16 -0.9914 0 -0.1305 -1 0 0 -1 0 -1
  [3,16,-0.9914,0,-0.1305,-1,0,0,-1,0,-1],
// 3 16 -0.9659 0 -0.2588 -0.9914 0 -0.1305 -1 0 -1
  [3,16,-0.9659,0,-0.2588,-0.9914,0,-0.1305,-1,0,-1],
// 3 16 -0.9239 0 -0.3827 -0.9659 0 -0.2588 -1 0 -1
  [3,16,-0.9239,0,-0.3827,-0.9659,0,-0.2588,-1,0,-1],
// 3 16 -0.866 0 -0.5 -0.9239 0 -0.3827 -1 0 -1
  [3,16,-0.866,0,-0.5,-0.9239,0,-0.3827,-1,0,-1],
// 3 16 -0.7934 0 -0.6088 -0.866 0 -0.5 -1 0 -1
  [3,16,-0.7934,0,-0.6088,-0.866,0,-0.5,-1,0,-1],
// 3 16 -0.7071 0 -0.7071 -0.7934 0 -0.6088 -1 0 -1
  [3,16,-0.7071,0,-0.7071,-0.7934,0,-0.6088,-1,0,-1],
// 3 16 -0.6088 0 -0.7934 -0.7071 0 -0.7071 -1 0 -1
  [3,16,-0.6088,0,-0.7934,-0.7071,0,-0.7071,-1,0,-1],
// 3 16 -0.5 0 -0.866 -0.6088 0 -0.7934 -1 0 -1
  [3,16,-0.5,0,-0.866,-0.6088,0,-0.7934,-1,0,-1],
// 3 16 -0.3827 0 -0.9239 -0.5 0 -0.866 -1 0 -1
  [3,16,-0.3827,0,-0.9239,-0.5,0,-0.866,-1,0,-1],
// 3 16 -0.2588 0 -0.9659 -0.3827 0 -0.9239 -1 0 -1
  [3,16,-0.2588,0,-0.9659,-0.3827,0,-0.9239,-1,0,-1],
// 3 16 -0.1305 0 -0.9914 -0.2588 0 -0.9659 -1 0 -1
  [3,16,-0.1305,0,-0.9914,-0.2588,0,-0.9659,-1,0,-1],
// 3 16 0 0 -1 -0.1305 0 -0.9914 -1 0 -1
  [3,16,0,0,-1,-0.1305,0,-0.9914,-1,0,-1],
// 3 16 0.1305 0 -0.9914 0 0 -1 1 0 -1
  [3,16,0.1305,0,-0.9914,0,0,-1,1,0,-1],
// 3 16 0.2588 0 -0.9659 0.1305 0 -0.9914 1 0 -1
  [3,16,0.2588,0,-0.9659,0.1305,0,-0.9914,1,0,-1],
// 3 16 0.3827 0 -0.9239 0.2588 0 -0.9659 1 0 -1
  [3,16,0.3827,0,-0.9239,0.2588,0,-0.9659,1,0,-1],
// 3 16 0.5 0 -0.866 0.3827 0 -0.9239 1 0 -1
  [3,16,0.5,0,-0.866,0.3827,0,-0.9239,1,0,-1],
// 3 16 0.6088 0 -0.7934 0.5 0 -0.866 1 0 -1
  [3,16,0.6088,0,-0.7934,0.5,0,-0.866,1,0,-1],
// 3 16 0.7071 0 -0.7071 0.6088 0 -0.7934 1 0 -1
  [3,16,0.7071,0,-0.7071,0.6088,0,-0.7934,1,0,-1],
// 3 16 0.7934 0 -0.6088 0.7071 0 -0.7071 1 0 -1
  [3,16,0.7934,0,-0.6088,0.7071,0,-0.7071,1,0,-1],
// 3 16 0.866 0 -0.5 0.7934 0 -0.6088 1 0 -1
  [3,16,0.866,0,-0.5,0.7934,0,-0.6088,1,0,-1],
// 3 16 0.9239 0 -0.3827 0.866 0 -0.5 1 0 -1
  [3,16,0.9239,0,-0.3827,0.866,0,-0.5,1,0,-1],
// 3 16 0.9659 0 -0.2588 0.9239 0 -0.3827 1 0 -1
  [3,16,0.9659,0,-0.2588,0.9239,0,-0.3827,1,0,-1],
// 3 16 0.9914 0 -0.1305 0.9659 0 -0.2588 1 0 -1
  [3,16,0.9914,0,-0.1305,0.9659,0,-0.2588,1,0,-1],
// 3 16 1 0 0 0.9914 0 -0.1305 1 0 -1
  [3,16,1,0,0,0.9914,0,-0.1305,1,0,-1],
];
module ldraw_lib__48__4_4ndis(step=0, col=false, unit=2/5, alt=false, line=0.2, solid=!$preview)
    makepoly(ldraw_lib__48__4_4ndis(solid), step=step, col=col, unit=unit, alt=alt, line=line, solid=solid);
ldraw_lib__48__4_4ndis(line=0.2);
// main file
use <../lib.scad>
use <../p/48/4-4ndis.scad>
use <s/3004s01.scad>
use <s/3068bp53s01.scad>
function ldraw_lib__3004p52() = [
// 0 Brick  1 x  2 with Shuttle and Yellow Circle Pattern
// 0 Name: 3004p52.dat
// 0 Author: Tim Lampmann [L4mpi]
// 0 !LDRAW_ORG Part UPDATE 2019-03
// 0 !LICENSE Licensed under CC BY 4.0 : see CAreadme.txt
// 
// 0 BFC CERTIFY CCW
  [0,"BFC","CERTIFY"],
  [0,"BFC","CCW"],
// 
// 0 !KEYWORDS Bricklink 3004pb010, Rebrickable 3004pr9965, Set 3067
// 
// 0 !HISTORY 2019-12-27 [PTadmin] Official Update 2019-03
// 
// 
// 1 16 0 0 0 1 0 0 0 1 0 0 0 1 s\3004s01.dat
  [1,16,0,0,0,1,0,0,0,1,0,0,0,1, ldraw_lib__s__3004s01()],
// 
// 1 16 0 11.5 -10 10.5 0 0 0 0 -10.5 0 1 0 48\4-4ndis.dat
  [1,16,0,11.5,-10,10.5,0,0,0,0,-10.5,0,1,0, ldraw_lib__48__4_4ndis()],
// 1 16 0 11.5 -10 0.525 0 0 0 0 -0.525 0 1 0 s\3068bp53s01.dat
  [1,16,0,11.5,-10,0.525,0,0,0,0,-0.525,0,1,0, ldraw_lib__s__3068bp53s01()],
// 
// 4 16 -20 0 -10 -10.5 1 -10 0 1 -10 20 0 -10
  [4,16,-20,0,-10,-10.5,1,-10,0,1,-10,20,0,-10],
// 3 16 20 0 -10 0 1 -10 10.5 1 -10
  [3,16,20,0,-10,0,1,-10,10.5,1,-10],
// 4 16 20 0 -10 10.5 1 -10 10.5 11.5 -10 20 24 -10
  [4,16,20,0,-10,10.5,1,-10,10.5,11.5,-10,20,24,-10],
// 3 16 10.5 11.5 -10 10.5 22 -10 20 24 -10
  [3,16,10.5,11.5,-10,10.5,22,-10,20,24,-10],
// 3 16 10.5 22 -10 0 22 -10 20 24 -10
  [3,16,10.5,22,-10,0,22,-10,20,24,-10],
// 4 16 20 24 -10 0 22 -10 -10.5 22 -10 -20 24 -10
  [4,16,20,24,-10,0,22,-10,-10.5,22,-10,-20,24,-10],
// 4 16 -20 24 -10 -10.5 22 -10 -10.5 11.5 -10 -20 0 -10
  [4,16,-20,24,-10,-10.5,22,-10,-10.5,11.5,-10,-20,0,-10],
// 3 16 -20 0 -10 -10.5 11.5 -10 -10.5 1 -10
  [3,16,-20,0,-10,-10.5,11.5,-10,-10.5,1,-10],
];
module ldraw_lib__3004p52(step=0, col=false, unit=2/5, alt=false, line=0.2, solid=!$preview)
    makepoly(ldraw_lib__3004p52(), step=step, col=col, unit=unit, alt=alt, line=line, solid=solid);
ldraw_lib__3004p52(line=0.2);
